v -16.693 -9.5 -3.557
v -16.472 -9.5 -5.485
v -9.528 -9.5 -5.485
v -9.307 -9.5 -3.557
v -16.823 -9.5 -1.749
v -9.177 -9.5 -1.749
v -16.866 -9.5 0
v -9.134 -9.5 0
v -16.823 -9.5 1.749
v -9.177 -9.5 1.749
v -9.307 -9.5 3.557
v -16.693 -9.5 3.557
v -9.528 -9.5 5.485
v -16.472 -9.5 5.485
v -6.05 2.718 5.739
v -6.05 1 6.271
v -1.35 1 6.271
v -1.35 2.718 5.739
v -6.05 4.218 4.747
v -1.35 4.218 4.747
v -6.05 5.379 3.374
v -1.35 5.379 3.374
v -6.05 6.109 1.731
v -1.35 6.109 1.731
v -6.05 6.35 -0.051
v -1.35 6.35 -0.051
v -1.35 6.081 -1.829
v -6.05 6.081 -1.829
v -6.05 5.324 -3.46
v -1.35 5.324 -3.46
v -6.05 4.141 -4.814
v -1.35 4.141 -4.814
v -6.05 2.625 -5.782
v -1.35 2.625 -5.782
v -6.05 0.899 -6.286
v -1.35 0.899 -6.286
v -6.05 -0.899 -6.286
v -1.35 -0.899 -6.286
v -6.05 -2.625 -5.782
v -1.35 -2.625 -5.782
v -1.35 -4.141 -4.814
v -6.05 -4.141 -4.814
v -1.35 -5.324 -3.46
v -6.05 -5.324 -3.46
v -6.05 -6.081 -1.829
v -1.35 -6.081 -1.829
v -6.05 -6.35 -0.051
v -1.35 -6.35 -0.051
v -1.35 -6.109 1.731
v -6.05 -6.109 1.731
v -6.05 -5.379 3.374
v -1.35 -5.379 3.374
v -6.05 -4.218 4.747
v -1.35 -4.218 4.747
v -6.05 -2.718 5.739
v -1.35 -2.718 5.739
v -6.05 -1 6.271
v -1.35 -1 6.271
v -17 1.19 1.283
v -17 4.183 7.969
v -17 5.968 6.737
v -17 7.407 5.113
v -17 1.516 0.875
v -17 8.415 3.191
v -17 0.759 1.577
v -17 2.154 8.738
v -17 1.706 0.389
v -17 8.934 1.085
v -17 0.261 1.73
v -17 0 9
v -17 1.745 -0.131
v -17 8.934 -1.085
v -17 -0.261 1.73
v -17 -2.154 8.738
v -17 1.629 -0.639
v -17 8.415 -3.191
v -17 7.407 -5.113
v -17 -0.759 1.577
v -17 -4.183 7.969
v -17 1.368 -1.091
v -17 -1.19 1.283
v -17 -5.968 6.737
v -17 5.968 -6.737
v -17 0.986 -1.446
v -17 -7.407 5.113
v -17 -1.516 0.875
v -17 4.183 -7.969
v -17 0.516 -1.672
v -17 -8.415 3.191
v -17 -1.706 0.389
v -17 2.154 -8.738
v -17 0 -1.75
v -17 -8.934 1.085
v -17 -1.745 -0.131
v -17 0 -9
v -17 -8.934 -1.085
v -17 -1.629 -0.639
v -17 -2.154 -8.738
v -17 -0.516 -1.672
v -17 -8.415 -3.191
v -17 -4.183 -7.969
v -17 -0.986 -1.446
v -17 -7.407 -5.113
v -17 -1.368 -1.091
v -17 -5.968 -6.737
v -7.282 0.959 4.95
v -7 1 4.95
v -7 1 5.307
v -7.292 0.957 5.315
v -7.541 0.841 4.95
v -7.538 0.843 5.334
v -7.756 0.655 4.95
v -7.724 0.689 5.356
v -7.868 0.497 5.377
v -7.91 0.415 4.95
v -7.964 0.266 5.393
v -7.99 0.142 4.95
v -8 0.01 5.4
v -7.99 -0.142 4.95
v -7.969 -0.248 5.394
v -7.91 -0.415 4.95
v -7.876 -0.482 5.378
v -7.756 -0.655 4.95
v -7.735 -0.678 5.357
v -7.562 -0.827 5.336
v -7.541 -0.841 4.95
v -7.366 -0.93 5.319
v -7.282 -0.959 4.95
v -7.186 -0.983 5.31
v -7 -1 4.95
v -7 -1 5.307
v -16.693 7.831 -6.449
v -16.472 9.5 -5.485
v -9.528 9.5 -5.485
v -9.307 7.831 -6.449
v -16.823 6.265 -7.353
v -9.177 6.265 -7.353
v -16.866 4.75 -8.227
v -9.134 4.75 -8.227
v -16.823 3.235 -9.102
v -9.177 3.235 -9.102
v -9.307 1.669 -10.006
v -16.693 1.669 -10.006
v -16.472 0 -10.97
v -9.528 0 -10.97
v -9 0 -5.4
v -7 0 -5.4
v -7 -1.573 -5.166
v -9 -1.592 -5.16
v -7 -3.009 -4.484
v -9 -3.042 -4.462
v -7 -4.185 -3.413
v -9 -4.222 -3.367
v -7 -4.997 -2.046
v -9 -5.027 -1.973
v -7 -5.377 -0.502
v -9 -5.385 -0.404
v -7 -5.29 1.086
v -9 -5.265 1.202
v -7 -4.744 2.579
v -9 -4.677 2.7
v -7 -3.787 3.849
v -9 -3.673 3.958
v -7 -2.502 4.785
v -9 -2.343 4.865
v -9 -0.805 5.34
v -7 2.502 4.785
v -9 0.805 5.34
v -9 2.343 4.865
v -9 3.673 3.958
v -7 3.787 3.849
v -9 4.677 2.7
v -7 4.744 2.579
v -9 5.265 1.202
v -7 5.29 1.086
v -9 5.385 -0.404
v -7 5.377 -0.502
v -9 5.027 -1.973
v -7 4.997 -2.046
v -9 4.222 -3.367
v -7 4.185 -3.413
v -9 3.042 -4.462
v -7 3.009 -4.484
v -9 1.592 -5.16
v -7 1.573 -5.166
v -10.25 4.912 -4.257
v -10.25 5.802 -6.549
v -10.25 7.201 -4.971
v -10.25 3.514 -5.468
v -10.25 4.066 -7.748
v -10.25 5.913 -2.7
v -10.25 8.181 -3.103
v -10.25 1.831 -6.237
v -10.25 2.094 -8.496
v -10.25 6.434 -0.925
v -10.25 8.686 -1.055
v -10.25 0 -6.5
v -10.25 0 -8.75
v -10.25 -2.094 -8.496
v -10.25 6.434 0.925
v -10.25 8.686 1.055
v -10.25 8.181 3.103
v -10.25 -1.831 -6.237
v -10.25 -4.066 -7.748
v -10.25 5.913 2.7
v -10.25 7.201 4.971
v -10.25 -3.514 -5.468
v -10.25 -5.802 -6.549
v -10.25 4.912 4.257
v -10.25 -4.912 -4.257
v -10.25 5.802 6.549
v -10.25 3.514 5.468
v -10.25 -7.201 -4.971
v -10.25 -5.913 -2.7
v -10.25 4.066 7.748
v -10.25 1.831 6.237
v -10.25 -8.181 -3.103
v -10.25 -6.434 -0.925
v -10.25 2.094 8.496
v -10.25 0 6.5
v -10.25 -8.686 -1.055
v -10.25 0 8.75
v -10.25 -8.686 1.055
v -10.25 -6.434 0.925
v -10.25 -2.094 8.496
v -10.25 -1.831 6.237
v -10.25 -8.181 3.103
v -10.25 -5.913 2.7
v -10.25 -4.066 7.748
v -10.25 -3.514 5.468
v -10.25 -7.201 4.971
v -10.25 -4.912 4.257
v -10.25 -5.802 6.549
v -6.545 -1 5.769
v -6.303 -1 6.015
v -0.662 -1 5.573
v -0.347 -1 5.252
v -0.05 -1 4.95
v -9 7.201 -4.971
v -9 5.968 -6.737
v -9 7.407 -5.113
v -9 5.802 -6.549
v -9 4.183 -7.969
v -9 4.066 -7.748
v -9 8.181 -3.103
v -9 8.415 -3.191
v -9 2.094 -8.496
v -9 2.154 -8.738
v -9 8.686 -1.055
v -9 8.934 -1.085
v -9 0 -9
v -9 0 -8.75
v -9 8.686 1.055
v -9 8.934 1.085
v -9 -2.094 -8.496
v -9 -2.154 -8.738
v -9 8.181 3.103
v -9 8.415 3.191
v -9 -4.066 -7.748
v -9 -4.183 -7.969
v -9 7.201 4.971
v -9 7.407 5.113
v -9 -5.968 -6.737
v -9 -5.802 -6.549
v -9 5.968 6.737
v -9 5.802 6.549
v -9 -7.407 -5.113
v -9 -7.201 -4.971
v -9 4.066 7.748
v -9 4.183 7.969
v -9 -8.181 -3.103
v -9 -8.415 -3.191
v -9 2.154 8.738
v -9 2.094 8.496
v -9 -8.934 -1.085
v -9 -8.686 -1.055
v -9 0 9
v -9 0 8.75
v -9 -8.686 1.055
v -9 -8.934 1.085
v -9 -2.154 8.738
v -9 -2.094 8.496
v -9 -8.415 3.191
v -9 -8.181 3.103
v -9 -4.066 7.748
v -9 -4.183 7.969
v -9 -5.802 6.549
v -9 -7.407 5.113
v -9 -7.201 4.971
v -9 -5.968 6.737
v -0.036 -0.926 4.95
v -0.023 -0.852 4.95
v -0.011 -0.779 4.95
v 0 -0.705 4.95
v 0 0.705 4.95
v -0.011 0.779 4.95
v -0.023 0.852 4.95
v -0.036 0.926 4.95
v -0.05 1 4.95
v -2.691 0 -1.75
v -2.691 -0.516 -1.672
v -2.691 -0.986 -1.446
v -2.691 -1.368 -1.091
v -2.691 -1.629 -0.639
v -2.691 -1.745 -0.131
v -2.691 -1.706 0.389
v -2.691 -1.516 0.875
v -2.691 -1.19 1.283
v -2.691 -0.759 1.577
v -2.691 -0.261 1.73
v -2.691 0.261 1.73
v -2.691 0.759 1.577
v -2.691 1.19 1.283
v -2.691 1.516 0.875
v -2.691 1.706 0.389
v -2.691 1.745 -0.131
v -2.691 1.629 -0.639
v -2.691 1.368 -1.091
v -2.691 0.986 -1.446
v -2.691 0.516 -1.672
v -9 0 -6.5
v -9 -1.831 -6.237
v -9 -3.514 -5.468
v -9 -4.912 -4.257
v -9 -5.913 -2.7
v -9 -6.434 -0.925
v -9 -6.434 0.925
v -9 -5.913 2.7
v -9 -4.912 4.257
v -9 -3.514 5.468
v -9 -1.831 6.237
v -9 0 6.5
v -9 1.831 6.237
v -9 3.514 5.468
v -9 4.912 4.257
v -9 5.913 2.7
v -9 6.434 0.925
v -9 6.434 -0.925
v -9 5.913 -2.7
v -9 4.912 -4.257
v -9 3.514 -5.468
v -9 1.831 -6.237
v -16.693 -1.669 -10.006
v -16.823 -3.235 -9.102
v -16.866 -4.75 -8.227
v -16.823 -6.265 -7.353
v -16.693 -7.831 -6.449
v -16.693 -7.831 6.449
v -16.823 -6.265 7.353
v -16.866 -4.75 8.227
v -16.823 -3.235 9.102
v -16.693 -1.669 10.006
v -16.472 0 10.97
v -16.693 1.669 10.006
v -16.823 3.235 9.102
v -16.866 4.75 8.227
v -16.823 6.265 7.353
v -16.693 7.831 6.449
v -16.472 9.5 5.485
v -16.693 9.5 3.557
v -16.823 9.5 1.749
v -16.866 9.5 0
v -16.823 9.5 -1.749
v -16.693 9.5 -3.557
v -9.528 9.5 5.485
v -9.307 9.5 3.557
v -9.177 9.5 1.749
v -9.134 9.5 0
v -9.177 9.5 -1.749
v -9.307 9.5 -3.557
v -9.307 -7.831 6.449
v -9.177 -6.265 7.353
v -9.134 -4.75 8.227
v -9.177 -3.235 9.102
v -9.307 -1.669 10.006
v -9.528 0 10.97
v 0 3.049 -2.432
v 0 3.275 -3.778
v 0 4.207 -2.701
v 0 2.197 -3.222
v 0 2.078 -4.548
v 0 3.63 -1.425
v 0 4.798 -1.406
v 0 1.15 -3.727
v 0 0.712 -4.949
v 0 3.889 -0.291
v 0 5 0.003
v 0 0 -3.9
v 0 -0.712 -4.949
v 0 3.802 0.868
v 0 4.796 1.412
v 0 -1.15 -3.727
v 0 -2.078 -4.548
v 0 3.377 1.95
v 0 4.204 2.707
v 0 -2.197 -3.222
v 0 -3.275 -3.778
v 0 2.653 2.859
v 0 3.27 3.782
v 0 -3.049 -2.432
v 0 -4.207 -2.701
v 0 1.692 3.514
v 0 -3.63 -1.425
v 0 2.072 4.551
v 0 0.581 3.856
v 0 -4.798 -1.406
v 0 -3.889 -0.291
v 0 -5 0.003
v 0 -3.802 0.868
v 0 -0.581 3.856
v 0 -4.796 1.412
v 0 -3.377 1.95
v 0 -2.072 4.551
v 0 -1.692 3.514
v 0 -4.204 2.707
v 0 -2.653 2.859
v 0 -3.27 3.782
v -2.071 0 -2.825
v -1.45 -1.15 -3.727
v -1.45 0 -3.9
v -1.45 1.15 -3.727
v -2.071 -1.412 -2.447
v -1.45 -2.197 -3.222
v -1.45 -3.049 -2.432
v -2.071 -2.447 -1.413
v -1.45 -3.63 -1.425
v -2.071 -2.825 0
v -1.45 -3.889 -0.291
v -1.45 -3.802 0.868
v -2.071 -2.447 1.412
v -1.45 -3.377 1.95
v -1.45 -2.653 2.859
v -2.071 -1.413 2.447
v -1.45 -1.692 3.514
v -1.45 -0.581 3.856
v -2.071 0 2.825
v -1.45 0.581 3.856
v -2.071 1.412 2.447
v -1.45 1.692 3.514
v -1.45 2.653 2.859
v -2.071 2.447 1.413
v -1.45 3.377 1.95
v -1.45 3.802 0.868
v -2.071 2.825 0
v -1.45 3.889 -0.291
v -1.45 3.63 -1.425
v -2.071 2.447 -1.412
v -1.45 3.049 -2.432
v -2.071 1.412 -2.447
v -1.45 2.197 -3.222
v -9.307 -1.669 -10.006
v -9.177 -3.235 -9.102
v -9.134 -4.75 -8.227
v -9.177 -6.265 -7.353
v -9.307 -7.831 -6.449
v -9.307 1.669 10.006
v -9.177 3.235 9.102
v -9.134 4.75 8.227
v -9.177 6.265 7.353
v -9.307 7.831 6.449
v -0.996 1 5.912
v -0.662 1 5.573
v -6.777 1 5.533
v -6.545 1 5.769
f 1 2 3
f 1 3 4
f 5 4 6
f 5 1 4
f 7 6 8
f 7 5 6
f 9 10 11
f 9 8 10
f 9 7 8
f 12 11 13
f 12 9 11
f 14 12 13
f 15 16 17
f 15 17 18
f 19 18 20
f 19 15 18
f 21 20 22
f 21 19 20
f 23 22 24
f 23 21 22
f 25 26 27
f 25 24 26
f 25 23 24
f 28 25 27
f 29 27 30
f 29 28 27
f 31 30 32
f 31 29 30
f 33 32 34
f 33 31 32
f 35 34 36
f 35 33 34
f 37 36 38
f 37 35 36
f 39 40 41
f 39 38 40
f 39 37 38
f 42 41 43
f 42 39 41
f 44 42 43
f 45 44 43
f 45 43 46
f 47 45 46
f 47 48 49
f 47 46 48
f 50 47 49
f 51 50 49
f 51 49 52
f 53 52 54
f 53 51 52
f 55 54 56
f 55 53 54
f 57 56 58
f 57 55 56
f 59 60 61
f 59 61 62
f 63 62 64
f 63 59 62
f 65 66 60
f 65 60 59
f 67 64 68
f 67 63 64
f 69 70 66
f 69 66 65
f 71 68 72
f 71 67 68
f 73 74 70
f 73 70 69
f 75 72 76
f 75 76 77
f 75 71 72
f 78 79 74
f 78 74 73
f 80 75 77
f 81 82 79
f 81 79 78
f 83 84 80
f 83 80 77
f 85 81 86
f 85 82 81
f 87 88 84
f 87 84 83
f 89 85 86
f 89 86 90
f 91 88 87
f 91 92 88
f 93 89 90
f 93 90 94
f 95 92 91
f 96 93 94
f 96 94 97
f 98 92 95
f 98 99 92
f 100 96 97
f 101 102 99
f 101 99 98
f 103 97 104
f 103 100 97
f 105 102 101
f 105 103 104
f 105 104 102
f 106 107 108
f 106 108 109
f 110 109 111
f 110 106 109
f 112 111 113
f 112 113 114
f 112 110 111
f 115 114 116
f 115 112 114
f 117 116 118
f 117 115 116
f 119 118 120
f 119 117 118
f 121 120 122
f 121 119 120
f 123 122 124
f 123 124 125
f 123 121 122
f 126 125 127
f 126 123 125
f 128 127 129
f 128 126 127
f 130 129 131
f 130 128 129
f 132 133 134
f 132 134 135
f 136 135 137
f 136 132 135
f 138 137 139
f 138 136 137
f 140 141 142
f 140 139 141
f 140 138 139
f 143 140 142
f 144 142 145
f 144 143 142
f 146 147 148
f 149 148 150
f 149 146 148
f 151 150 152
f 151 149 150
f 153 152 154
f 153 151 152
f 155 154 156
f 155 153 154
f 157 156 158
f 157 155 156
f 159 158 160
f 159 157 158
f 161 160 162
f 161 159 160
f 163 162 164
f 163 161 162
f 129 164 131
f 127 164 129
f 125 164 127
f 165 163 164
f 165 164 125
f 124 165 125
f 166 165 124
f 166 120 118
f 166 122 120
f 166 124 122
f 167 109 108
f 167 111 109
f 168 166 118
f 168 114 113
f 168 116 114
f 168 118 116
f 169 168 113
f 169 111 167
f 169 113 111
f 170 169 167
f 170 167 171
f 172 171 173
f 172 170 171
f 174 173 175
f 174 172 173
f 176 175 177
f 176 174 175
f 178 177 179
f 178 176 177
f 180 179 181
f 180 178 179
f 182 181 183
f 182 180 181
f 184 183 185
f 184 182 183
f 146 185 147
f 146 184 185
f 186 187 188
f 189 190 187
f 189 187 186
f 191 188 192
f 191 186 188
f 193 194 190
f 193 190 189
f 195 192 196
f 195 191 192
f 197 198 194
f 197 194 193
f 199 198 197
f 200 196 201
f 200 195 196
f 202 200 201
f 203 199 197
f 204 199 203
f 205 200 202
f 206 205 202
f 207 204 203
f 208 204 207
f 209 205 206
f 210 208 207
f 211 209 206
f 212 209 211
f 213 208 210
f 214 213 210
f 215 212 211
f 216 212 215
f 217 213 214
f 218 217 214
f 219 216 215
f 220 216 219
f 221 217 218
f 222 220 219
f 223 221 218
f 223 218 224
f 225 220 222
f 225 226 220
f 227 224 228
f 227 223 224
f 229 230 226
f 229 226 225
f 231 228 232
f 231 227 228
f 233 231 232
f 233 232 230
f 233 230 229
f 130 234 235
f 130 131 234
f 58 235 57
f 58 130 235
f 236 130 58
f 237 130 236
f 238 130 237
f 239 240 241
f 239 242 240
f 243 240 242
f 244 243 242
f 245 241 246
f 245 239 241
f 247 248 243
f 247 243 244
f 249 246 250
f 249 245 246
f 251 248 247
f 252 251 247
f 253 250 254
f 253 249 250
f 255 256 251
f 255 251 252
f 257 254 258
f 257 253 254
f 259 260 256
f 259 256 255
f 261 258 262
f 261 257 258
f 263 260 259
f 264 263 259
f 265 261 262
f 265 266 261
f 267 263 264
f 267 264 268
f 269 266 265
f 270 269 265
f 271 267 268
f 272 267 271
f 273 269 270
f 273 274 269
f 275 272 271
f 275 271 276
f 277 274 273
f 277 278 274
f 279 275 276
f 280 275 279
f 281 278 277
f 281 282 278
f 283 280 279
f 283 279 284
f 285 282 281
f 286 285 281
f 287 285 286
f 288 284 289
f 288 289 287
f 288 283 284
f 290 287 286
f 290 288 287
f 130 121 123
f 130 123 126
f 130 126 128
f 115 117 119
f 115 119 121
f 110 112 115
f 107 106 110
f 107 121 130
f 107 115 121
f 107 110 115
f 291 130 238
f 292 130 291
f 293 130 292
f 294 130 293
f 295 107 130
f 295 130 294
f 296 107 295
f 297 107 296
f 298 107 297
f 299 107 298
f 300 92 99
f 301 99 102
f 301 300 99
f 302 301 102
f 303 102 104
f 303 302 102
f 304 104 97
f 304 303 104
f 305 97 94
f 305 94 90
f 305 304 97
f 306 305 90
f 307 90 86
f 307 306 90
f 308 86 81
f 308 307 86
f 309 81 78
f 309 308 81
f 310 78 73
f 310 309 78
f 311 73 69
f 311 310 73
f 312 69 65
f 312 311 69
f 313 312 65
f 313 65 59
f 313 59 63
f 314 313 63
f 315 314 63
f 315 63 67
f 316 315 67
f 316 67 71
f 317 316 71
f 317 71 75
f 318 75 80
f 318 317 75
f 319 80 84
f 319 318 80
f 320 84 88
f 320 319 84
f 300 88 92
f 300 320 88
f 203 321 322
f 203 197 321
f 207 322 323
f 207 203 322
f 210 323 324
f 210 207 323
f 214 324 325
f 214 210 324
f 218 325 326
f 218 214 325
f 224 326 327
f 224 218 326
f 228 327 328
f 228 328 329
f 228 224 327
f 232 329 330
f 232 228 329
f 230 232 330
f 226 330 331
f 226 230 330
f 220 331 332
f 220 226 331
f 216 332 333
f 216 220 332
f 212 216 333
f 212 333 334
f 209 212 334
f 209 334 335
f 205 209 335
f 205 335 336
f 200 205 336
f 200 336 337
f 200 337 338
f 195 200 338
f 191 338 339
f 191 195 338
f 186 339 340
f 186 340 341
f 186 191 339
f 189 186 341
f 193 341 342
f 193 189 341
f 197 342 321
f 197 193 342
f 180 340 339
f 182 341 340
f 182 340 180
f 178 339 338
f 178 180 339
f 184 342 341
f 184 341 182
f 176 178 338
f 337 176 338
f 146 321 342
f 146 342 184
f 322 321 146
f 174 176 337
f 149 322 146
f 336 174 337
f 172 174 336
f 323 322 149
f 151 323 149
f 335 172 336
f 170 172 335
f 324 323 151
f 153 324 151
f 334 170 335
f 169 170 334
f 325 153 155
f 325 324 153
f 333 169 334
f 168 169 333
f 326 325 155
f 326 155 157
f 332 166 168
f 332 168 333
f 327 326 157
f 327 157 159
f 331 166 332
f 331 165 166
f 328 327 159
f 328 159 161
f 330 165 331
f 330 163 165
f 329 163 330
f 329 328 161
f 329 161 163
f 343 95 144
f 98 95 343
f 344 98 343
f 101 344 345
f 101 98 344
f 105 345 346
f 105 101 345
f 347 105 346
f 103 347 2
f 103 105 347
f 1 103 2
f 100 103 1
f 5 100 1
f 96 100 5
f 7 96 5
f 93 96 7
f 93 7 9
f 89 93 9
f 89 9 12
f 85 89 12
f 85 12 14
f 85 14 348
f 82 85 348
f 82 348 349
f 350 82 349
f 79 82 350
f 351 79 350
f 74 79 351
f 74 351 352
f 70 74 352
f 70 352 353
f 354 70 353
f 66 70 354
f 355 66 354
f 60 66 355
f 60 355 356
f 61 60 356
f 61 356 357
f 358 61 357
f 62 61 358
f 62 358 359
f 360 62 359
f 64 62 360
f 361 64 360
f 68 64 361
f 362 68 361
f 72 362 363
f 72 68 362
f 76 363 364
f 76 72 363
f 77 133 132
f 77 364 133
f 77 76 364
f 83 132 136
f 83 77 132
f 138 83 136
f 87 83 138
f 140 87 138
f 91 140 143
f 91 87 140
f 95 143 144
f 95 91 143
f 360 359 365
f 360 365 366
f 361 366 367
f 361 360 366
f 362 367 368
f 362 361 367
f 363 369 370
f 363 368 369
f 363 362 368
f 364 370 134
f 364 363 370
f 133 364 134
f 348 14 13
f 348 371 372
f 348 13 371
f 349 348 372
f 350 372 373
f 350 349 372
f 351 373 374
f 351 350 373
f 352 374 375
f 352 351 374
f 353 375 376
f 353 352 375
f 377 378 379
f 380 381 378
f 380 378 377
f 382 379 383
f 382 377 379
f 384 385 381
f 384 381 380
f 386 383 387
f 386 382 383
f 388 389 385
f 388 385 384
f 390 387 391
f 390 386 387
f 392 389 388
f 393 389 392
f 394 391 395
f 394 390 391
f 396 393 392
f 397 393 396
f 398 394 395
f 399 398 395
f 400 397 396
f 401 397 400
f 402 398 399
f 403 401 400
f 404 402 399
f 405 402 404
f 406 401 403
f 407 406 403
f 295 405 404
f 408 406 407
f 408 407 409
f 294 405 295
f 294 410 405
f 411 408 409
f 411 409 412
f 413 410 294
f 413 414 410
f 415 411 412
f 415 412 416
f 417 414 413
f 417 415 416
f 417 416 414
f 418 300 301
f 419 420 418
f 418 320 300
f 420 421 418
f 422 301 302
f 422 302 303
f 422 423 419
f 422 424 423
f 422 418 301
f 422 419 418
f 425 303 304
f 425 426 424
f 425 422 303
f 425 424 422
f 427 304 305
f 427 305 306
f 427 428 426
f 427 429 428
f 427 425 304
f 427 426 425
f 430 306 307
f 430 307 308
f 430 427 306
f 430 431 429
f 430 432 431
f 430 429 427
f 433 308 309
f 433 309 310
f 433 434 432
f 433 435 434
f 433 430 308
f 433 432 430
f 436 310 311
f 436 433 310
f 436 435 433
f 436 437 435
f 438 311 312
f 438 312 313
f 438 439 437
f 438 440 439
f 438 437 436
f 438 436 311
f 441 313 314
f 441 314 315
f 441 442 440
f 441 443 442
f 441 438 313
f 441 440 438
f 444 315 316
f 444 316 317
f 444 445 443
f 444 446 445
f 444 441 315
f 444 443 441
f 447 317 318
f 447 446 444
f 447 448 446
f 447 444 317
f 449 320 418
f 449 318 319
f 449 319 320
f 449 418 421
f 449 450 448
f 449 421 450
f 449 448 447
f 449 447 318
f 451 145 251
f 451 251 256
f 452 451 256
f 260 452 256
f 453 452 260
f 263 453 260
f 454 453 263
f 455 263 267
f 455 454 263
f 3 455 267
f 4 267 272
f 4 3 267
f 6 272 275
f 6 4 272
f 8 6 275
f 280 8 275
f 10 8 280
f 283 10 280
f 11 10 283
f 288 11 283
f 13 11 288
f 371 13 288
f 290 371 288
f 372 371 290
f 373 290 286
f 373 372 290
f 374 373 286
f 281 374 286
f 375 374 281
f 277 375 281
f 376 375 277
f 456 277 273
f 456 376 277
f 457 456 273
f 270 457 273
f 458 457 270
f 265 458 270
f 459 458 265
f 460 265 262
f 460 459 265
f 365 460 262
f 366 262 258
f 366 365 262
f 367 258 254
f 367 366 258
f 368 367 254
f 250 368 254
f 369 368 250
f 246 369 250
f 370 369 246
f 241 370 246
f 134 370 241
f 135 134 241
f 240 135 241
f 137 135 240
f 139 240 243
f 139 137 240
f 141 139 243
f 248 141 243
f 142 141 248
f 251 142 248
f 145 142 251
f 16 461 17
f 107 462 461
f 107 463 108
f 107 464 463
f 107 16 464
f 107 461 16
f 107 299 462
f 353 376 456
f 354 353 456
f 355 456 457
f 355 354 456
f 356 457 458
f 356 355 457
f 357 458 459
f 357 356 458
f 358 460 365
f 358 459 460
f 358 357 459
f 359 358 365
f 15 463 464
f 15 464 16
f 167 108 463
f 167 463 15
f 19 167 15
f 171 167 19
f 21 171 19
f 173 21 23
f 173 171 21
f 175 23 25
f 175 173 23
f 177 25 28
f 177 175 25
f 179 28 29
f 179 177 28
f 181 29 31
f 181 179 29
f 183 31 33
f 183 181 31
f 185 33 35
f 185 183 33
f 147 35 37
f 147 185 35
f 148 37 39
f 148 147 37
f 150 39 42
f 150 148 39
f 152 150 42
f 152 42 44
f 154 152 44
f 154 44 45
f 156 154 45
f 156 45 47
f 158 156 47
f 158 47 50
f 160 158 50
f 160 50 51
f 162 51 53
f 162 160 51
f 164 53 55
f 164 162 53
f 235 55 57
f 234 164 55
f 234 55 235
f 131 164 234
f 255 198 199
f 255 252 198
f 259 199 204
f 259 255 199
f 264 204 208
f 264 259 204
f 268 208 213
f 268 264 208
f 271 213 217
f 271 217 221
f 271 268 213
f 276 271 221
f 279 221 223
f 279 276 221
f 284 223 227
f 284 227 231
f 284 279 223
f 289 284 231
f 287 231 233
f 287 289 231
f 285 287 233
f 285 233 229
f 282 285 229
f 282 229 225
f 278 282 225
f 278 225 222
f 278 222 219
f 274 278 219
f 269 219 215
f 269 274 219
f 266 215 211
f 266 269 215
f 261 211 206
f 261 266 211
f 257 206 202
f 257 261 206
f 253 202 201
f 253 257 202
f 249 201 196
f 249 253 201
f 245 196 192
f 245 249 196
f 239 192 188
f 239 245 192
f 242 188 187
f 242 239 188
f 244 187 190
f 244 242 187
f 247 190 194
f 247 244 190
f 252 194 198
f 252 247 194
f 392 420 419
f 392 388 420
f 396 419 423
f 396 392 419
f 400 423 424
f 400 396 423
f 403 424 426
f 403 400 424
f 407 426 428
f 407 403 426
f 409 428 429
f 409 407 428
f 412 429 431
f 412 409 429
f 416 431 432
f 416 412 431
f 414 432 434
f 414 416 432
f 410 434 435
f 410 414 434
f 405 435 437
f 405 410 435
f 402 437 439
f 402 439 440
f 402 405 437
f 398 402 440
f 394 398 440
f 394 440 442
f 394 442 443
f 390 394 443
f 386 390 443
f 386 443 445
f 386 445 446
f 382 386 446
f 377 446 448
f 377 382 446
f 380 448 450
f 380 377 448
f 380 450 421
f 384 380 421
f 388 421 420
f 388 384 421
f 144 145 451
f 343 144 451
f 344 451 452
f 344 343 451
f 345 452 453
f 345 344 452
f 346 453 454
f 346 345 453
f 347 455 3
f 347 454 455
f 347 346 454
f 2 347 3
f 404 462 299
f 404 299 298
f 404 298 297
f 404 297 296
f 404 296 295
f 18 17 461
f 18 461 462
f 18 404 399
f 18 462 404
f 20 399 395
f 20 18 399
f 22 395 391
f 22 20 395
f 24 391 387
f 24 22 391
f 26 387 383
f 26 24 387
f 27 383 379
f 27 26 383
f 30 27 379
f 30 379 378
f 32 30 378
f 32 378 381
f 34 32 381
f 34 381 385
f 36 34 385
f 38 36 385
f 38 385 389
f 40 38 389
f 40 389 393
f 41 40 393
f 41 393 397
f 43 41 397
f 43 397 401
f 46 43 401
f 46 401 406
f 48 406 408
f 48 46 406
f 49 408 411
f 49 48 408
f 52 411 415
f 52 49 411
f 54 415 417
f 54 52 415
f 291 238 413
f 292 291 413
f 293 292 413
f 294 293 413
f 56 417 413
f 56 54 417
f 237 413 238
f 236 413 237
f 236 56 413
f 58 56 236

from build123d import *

# Parameters (mm, degrees)
SKETCH2_OUTSIDE_W  = 41.142
SKETCH2_OUTSIDE_H  = 41.142
CUT_EXTRUDE1_DEPTH = 28.184554438
CUT_EXTRUDE3_DEPTH = 10


with BuildPart() as part:
    # Sketch1 → Revolve1 (revolve)
    with BuildSketch(Plane.XY, mode=Mode.PRIVATE) as revolve1_sk:
        Polygon((0, 3.9), (0, 5), (-1.35, 6.35), (-6.05, 6.35), (-7, 5.4), (-9, 5.4), (-9, 6.5), (-10.25, 6.5), (-10.25, 8.75), (-9, 8.75), (-9, 9), (-10.607695155, 15), (-15.392304845, 15), (-17, 9), (-17, 1.75), (-2.691303079, 1.75), (-1.45, 3.9), align=None)
    revolve(revolve1_sk.sketch.rotate(Axis((0, 0, 0), (-1, 0, 0)), 90), axis=Axis((0, 0, 0), (-1, 0, 0)))

    # Sketch2 outside → Cut-Extrude1 (cut, through all)
    with BuildSketch(Plane.ZY.offset(17)):
        Rectangle(SKETCH2_OUTSIDE_W, SKETCH2_OUTSIDE_H)
        Polygon((10.969655115, 0), (5.484827557, 9.5), (-5.484827557, 9.5), (-10.969655115, 0), (-5.484827557, -9.5), (5.484827557, -9.5), align=None, mode=Mode.SUBTRACT)
    extrude(amount=-CUT_EXTRUDE1_DEPTH, mode=Mode.SUBTRACT)

    # Sketch3 → Cut-Extrude3 (cut)
    with BuildSketch(Plane.XY.offset(4.95)):
        with BuildLine():
            Line((0, 1), (-7, 1))
            ThreePointArc((-7, 1), (-8, 0), (-7, -1))
            Line((-7, -1), (0, -1))
            Line((0, -1), (0, 0))
            Line((0, 0), (0, 1))
        make_face()
    extrude(amount=CUT_EXTRUDE3_DEPTH, mode=Mode.SUBTRACT)


solid = part.part
